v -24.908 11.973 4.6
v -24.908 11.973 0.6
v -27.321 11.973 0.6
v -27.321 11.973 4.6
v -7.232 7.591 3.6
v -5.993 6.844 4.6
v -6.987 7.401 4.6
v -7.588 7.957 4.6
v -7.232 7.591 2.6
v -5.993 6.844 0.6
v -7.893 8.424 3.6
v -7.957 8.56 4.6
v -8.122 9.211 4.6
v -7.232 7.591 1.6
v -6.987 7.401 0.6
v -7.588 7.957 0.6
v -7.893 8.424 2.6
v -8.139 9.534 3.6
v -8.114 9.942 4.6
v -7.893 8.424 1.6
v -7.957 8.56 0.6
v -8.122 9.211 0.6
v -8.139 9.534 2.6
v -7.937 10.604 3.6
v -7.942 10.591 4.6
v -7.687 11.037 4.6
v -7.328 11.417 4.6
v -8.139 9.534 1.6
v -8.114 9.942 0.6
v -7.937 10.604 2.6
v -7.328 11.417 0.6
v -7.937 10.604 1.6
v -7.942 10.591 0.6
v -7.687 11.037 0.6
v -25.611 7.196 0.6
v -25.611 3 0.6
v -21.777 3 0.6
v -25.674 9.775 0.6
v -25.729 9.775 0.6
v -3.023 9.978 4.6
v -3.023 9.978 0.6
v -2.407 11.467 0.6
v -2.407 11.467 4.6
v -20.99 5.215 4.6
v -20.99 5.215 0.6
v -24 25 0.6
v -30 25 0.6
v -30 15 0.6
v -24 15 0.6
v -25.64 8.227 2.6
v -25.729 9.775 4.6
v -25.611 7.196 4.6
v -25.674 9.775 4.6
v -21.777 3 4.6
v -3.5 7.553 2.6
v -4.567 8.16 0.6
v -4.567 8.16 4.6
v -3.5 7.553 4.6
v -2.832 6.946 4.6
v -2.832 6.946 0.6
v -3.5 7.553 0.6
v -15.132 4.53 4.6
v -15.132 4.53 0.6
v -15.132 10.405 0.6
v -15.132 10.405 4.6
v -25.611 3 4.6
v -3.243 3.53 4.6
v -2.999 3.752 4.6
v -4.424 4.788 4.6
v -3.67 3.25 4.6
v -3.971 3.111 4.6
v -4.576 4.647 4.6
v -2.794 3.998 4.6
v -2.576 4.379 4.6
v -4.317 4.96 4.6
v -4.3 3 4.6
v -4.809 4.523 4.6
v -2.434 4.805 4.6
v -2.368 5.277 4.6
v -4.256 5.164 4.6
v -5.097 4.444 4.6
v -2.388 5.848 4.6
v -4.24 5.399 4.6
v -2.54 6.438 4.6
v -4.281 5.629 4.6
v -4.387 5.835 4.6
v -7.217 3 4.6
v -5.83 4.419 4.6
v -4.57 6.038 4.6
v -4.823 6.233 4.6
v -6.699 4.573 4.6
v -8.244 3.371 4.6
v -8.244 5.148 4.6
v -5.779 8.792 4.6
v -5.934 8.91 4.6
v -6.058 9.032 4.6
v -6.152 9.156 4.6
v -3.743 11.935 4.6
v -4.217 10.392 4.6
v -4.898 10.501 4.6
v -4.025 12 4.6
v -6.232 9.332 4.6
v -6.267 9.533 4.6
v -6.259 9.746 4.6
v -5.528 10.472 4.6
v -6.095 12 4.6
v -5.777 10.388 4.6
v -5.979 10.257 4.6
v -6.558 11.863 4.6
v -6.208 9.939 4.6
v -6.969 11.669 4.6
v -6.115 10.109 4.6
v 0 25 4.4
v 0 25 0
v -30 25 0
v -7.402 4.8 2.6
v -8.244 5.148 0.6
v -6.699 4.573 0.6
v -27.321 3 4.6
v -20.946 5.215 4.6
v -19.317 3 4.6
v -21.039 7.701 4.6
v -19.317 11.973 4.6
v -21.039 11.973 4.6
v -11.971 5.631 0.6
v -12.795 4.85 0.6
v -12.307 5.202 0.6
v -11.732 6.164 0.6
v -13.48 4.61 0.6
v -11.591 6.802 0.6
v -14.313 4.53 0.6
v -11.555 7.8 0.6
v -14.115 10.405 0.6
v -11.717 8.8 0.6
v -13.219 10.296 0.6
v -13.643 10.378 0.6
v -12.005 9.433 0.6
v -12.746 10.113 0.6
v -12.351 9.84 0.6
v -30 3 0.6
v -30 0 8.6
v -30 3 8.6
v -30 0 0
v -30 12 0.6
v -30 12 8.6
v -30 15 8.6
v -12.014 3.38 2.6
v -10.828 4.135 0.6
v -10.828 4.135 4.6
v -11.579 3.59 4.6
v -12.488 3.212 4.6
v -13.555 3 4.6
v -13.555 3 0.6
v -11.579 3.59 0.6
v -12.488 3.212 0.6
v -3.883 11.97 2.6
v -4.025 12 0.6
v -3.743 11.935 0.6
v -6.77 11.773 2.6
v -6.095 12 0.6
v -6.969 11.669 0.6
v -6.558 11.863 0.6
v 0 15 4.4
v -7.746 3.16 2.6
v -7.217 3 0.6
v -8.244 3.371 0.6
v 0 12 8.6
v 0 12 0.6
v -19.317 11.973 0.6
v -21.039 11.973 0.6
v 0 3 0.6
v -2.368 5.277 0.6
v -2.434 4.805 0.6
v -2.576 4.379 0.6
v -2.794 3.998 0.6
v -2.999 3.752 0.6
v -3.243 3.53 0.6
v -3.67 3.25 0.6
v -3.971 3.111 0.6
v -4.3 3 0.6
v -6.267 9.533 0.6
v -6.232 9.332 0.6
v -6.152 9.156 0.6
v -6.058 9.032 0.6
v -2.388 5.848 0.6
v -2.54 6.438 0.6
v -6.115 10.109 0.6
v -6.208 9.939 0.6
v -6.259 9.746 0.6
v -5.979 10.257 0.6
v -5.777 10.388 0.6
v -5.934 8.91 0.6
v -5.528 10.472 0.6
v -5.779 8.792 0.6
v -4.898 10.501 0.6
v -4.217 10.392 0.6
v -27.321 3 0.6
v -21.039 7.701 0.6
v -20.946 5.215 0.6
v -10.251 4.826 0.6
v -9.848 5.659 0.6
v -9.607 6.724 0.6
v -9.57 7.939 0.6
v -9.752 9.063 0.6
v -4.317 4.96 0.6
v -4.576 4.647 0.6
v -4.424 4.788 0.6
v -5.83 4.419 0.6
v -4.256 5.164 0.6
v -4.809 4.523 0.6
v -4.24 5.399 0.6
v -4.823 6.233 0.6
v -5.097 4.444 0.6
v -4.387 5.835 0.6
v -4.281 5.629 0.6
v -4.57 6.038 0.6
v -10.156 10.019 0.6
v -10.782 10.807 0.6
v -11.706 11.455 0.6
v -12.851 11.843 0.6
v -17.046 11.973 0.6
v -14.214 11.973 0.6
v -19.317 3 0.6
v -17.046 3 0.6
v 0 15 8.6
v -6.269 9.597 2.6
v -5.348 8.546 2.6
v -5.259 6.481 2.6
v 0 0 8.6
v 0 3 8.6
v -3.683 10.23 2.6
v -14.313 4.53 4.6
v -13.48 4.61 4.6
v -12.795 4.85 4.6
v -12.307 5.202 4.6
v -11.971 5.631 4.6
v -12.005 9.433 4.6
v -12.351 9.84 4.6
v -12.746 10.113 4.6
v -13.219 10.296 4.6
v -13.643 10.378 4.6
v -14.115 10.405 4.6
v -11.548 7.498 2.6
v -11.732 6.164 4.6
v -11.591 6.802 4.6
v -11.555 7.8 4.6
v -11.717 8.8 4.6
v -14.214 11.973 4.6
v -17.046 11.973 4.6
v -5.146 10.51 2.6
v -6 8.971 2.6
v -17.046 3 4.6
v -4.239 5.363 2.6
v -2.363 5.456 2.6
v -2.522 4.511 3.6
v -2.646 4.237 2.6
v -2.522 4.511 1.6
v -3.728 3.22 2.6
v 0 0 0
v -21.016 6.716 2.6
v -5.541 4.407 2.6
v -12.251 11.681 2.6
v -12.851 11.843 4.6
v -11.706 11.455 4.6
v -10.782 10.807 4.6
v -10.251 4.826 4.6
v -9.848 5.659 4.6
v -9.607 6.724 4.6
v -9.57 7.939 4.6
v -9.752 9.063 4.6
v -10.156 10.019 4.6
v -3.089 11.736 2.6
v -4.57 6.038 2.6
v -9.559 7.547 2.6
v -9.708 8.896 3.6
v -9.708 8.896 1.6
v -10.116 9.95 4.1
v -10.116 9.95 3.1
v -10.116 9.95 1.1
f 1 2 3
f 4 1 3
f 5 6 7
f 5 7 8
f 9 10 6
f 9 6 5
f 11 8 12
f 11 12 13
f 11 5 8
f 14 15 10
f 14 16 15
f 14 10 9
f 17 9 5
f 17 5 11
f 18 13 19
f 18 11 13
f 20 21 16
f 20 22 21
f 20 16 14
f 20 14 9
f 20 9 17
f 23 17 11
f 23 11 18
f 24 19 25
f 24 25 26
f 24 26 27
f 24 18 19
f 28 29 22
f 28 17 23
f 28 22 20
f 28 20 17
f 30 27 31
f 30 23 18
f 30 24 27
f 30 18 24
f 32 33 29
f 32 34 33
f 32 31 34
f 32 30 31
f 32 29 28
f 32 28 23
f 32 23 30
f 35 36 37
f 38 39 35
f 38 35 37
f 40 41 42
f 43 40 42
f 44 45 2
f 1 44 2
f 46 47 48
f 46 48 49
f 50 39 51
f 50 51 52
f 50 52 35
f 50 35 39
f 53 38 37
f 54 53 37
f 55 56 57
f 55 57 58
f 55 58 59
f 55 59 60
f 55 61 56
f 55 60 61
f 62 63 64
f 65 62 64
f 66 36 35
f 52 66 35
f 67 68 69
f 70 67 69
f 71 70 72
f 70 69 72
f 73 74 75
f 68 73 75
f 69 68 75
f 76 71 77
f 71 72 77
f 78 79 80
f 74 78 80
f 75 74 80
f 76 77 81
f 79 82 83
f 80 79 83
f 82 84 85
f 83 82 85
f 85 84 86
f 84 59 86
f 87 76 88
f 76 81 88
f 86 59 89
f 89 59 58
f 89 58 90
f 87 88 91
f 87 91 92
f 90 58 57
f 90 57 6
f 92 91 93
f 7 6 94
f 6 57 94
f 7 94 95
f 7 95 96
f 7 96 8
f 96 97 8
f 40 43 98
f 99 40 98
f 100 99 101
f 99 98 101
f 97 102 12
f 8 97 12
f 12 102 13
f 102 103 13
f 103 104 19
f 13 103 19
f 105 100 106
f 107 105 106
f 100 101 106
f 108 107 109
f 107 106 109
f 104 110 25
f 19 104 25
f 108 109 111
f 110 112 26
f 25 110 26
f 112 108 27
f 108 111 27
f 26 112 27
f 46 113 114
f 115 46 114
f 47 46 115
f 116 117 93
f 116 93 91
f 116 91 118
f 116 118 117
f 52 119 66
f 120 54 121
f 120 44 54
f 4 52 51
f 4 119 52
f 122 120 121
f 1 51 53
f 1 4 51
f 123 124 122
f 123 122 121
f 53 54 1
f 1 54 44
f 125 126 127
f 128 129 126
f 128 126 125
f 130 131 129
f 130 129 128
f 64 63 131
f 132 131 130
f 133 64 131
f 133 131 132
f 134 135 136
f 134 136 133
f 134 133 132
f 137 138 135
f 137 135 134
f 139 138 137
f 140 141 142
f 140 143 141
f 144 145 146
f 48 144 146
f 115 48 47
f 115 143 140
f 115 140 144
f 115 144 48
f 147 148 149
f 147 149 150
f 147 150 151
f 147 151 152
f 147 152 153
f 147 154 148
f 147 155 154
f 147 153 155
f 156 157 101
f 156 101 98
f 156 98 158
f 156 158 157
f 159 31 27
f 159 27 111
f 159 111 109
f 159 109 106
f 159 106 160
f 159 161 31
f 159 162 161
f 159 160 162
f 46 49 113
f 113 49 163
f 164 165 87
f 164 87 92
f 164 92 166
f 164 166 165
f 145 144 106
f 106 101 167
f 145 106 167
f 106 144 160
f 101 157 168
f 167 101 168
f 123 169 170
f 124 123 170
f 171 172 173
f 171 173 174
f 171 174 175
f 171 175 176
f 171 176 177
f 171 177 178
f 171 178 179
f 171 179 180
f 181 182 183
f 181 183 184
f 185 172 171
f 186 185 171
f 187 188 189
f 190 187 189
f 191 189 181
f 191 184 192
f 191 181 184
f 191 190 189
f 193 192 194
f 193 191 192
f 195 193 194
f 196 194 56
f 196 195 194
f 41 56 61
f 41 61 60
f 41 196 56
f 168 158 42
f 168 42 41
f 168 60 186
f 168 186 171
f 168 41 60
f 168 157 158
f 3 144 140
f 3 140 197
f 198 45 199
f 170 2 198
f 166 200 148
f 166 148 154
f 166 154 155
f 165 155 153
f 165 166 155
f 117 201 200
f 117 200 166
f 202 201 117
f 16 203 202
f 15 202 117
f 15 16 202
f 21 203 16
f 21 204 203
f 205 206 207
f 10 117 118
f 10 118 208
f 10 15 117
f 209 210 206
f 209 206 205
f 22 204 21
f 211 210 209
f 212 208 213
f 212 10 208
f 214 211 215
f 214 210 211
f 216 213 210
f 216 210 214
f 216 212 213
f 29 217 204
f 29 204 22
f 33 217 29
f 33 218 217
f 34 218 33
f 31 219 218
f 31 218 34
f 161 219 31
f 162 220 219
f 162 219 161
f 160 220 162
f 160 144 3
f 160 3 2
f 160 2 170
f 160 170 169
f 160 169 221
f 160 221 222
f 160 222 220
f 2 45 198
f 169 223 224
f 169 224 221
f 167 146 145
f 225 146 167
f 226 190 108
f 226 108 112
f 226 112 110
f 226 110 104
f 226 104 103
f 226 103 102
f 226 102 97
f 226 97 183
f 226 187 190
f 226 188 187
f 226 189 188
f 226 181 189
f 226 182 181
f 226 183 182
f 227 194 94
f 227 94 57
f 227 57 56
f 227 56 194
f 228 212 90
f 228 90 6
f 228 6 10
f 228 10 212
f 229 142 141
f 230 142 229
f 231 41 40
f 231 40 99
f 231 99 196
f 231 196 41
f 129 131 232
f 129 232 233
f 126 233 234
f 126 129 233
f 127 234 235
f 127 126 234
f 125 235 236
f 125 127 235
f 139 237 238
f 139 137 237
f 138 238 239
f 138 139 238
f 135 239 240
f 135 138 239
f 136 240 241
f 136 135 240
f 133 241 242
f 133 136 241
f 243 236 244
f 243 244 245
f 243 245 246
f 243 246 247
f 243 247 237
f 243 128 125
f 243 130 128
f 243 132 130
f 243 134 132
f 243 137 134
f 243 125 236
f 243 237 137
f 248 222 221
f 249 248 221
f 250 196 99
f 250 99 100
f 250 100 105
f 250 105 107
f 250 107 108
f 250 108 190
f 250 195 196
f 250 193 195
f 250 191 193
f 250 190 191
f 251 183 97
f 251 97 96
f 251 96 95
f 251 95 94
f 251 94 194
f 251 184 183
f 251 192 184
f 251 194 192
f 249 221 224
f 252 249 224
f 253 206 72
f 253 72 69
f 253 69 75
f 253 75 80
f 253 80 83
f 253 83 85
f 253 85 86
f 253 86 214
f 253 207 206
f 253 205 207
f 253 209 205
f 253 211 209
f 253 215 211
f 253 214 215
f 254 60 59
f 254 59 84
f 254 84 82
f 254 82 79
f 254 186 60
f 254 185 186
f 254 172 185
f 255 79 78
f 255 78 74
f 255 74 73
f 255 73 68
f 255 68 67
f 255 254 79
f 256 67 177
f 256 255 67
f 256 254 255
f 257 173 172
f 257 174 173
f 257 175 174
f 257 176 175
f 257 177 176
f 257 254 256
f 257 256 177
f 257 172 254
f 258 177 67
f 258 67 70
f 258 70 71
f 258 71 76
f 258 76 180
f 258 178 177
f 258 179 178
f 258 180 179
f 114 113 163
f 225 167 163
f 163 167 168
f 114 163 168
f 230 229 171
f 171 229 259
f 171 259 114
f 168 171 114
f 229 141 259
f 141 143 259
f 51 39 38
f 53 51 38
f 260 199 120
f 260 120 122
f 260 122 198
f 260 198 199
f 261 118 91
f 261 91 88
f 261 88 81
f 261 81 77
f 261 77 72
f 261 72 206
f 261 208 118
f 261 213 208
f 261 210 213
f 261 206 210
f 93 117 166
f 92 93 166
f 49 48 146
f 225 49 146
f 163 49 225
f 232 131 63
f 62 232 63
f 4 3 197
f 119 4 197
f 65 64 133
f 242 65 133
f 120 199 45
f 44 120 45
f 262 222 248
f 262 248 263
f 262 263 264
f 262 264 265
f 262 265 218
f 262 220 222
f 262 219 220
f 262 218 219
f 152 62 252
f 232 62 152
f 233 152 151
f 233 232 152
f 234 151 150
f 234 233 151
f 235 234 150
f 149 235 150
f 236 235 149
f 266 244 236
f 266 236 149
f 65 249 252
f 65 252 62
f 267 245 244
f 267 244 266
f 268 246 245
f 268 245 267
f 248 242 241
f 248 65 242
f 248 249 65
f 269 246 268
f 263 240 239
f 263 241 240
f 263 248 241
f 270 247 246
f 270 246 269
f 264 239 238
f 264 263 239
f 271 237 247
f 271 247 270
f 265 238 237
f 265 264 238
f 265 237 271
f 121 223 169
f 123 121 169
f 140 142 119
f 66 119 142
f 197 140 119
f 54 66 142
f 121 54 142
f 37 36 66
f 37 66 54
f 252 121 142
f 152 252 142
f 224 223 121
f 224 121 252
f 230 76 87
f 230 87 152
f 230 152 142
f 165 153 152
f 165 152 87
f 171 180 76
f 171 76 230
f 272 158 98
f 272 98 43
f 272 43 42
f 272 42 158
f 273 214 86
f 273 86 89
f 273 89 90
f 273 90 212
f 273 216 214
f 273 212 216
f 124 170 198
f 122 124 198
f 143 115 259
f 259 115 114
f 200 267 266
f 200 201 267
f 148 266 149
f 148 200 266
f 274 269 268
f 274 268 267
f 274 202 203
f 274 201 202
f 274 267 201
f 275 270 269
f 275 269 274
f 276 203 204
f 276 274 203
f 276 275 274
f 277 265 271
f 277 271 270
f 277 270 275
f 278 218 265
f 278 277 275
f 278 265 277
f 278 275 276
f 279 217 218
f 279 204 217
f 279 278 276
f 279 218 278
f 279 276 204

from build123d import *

# Parameters (mm, degrees)
F0_W     = 30
F0_H     = 10
F0_H_2   = 15
F1_DEPTH = 0.6
F2_W     = 30
F2_H     = 3
F3_DEPTH = 8
F5_DEPTH = 10
F7_DEPTH = 4


with BuildPart() as f1:
    # F0 (on Top) → F1 (new body)
    with BuildSketch(Plane.XY):
        with Locations((-15, 20)):
            Rectangle(F0_W, F0_H)
        with Locations((-15, 7.5)):
            Rectangle(F0_W, F0_H_2)
    extrude(amount=F1_DEPTH)

    # F2 (on face) → F3 (join)
    with BuildSketch(Plane.XY.offset(0.6)):
        with Locations((-15, 13.5)):
            Rectangle(F2_W, F2_H)
        with Locations((-15, 1.5)):
            Rectangle(F2_W, F2_H)
    extrude(amount=F3_DEPTH)

    # F4 (on face) → F5 (join)
    with BuildSketch(Plane(origin=(0, 15, 0), x_dir=(-1, 0, 0), z_dir=(0, 1, 0))):
        Polygon((24, 0.6), (0, 4.4), (0, 0.6), align=None)
    extrude(amount=F5_DEPTH)

    # F6 (on face) → F7 (join)
    with BuildSketch(Plane.XY.offset(0.6)):
        Polygon((-21.7479817708, 2.95), (-19.3169704861, 2.95), (-19.3169704861, 3), (-21.7767433449, 3), align=None)
        with BuildLine():
            Line((-17.0459201389, 11.9729817708), (-17.0459201389, 3))
            Line((-17.0459201389, 3), (-13.5546069033, 3))
            add(Edge.make_bspline(
                [(-10.8281792535, 4.1348958333), (-11.8363616657, 3.1934025301), (-13.5546069033, 3)],
                knots=[0, 0, 0, 0.7945789636, 0.7945789636, 0.7945789636], degree=2))
            add(Edge.make_bspline(
                [(-9.5593532986, 7.5473958333), (-9.5593532986, 5.3197916667), (-10.8281792535, 4.1348958333)],
                knots=[0, 0, 0, 1, 1, 1], degree=2))
            add(Edge.make_bspline(
                [(-10.7817708333, 10.8068467882), (-9.5593532986, 9.6407118056), (-9.5593532986, 7.5473958333)],
                knots=[0, 0, 0, 1, 1, 1], degree=2))
            add(Edge.make_bspline(
                [(-14.2140190972, 11.9729817708), (-12.0041883681, 11.9729817708), (-10.7817708333, 10.8068467882)],
                knots=[0, 0, 0, 1, 1, 1], degree=2))
            Line((-14.2140190972, 11.9729817708), (-17.0459201389, 11.9729817708))
        make_face()
        with BuildLine():
            add(Edge.make_bspline(
                [(-11.5480034722, 7.4980251736), (-11.5480034722, 10.4049696181), (-14.1152777778, 10.4049696181)],
                knots=[0, 0, 0, 1, 1, 1], degree=2))
            add(Edge.make_bspline(
                [(-14.3127604167, 4.5298611111), (-11.5480034722, 4.5298611111), (-11.5480034722, 7.4980251736)],
                knots=[0, 0, 0, 1, 1, 1], degree=2))
            Line((-14.3127604167, 4.5298611111), (-15.1323133681, 4.5298611111))
            Line((-15.1323133681, 4.5298611111), (-15.1323133681, 10.4049696181))
            Line((-15.1323133681, 10.4049696181), (-14.1152777778, 10.4049696181))
        make_face(mode=Mode.SUBTRACT)
        with BuildLine():
            add(Edge.make_bspline(
                [(-7.2167314747, 3), (-7.7620891499, 3.1339116551), (-8.2441189236, 3.3706380208)],
                knots=[0.5656812019, 0.5656812019, 0.5656812019, 1, 1, 1], degree=2))
            Line((-7.2167314747, 3), (-4.2997672598, 3))
            add(Edge.make_bspline(
                [(-3.2428710938, 3.5296115451), (-3.6847580589, 3.176002784), (-4.2997672598, 3)],
                knots=[0, 0, 0, 0.5022669023, 0.5022669023, 0.5022669023], degree=2))
            add(Edge.make_bspline(
                [(-2.3630859375, 5.4560546875), (-2.3630859375, 4.2336371528), (-3.2428710938, 3.5296115451)],
                knots=[0, 0, 0, 1, 1, 1], degree=2))
            add(Edge.make_bspline(
                [(-2.8321072049, 6.9460611979), (-2.3630859375, 6.3388020833), (-2.3630859375, 5.4560546875)],
                knots=[0, 0, 0, 1, 1, 1], degree=2))
            add(Edge.make_bspline(
                [(-4.5669921875, 8.1595920139), (-3.3011284722, 7.5533203125), (-2.8321072049, 6.9460611979)],
                knots=[0, 0, 0, 1, 1, 1], degree=2))
            add(Edge.make_bspline(
                [(-5.7785481771, 8.7915364583), (-5.5228081597, 8.6157769097), (-4.5669921875, 8.1595920139)],
                knots=[0, 0, 0, 1, 1, 1], degree=2))
            add(Edge.make_bspline(
                [(-6.1517903646, 9.1558919271), (-6.0342881944, 8.9672960069), (-5.7785481771, 8.7915364583)],
                knots=[0, 0, 0, 1, 1, 1], degree=2))
            add(Edge.make_bspline(
                [(-6.2692925347, 9.597265625), (-6.2692925347, 9.3444878472), (-6.1517903646, 9.1558919271)],
                knots=[0, 0, 0, 1, 1, 1], degree=2))
            add(Edge.make_bspline(
                [(-5.9789930556, 10.2568576389), (-6.2692925347, 10.0040798611), (-6.2692925347, 9.597265625)],
                knots=[0, 0, 0, 1, 1, 1], degree=2))
            add(Edge.make_bspline(
                [(-5.1456163194, 10.5096354167), (-5.6886935764, 10.5096354167), (-5.9789930556, 10.2568576389)],
                knots=[0, 0, 0, 1, 1, 1], degree=2))
            add(Edge.make_bspline(
                [(-4.2174479167, 10.3921332465), (-4.6894314236, 10.5096354167), (-5.1456163194, 10.5096354167)],
                knots=[0, 0, 0, 1, 1, 1], degree=2))
            add(Edge.make_bspline(
                [(-3.0226779514, 9.9784071181), (-3.7454644097, 10.2746310764), (-4.2174479167, 10.3921332465)],
                knots=[0, 0, 0, 1, 1, 1], degree=2))
            Line((-3.0226779514, 9.9784071181), (-2.4065321181, 11.4674262153))
            add(Edge.make_bspline(
                [(-3.7425021701, 11.9354600694), (-3.1036458333, 11.7695746528), (-2.4065321181, 11.4674262153)],
                knots=[0, 0, 0, 1, 1, 1], degree=2))
            add(Edge.make_bspline(
                [(-4.024584157, 12), (-3.8820128143, 11.971685399), (-3.7425021701, 11.9354600694)],
                knots=[0.781624387, 0.781624387, 0.781624387, 1, 1, 1], degree=2))
            Line((-4.024584157, 12), (-6.0945606148, 12))
            add(Edge.make_bspline(
                [(-7.3277994792, 11.4170681424), (-6.8285068793, 11.8380046043), (-6.0945606148, 12)],
                knots=[0, 0, 0, 0.6151547553, 0.6151547553, 0.6151547553], degree=2))
            add(Edge.make_bspline(
                [(-8.139453125, 9.5340711806), (-8.139453125, 10.7327907986), (-7.3277994792, 11.4170681424)],
                knots=[0, 0, 0, 1, 1, 1], degree=2))
            add(Edge.make_bspline(
                [(-7.8925998264, 8.42421875), (-8.139453125, 8.9001519097), (-8.139453125, 9.5340711806)],
                knots=[0, 0, 0, 1, 1, 1], degree=2))
            add(Edge.make_bspline(
                [(-7.2320203993, 7.5908420139), (-7.6457465278, 7.9482855903), (-7.8925998264, 8.42421875)],
                knots=[0, 0, 0, 1, 1, 1], degree=2))
            add(Edge.make_bspline(
                [(-5.9928168403, 6.8443576389), (-6.8182942708, 7.2333984375), (-7.2320203993, 7.5908420139)],
                knots=[0, 0, 0, 1, 1, 1], degree=2))
            add(Edge.make_bspline(
                [(-4.8227322049, 6.2331488715), (-5.1100694444, 6.4237196181), (-5.9928168403, 6.8443576389)],
                knots=[0, 0, 0, 1, 1, 1], degree=2))
            add(Edge.make_bspline(
                [(-4.3872829861, 5.8352213542), (-4.5353949653, 6.042578125), (-4.8227322049, 6.2331488715)],
                knots=[0, 0, 0, 1, 1, 1], degree=2))
            add(Edge.make_bspline(
                [(-4.2391710069, 5.3632378472), (-4.2391710069, 5.6278645833), (-4.3872829861, 5.8352213542)],
                knots=[0, 0, 0, 1, 1, 1], degree=2))
            add(Edge.make_bspline(
                [(-4.5758789063, 4.6473632812), (-4.2391710069, 4.8873046875), (-4.2391710069, 5.3632378472)],
                knots=[0, 0, 0, 1, 1, 1], degree=2))
            add(Edge.make_bspline(
                [(-5.5405815972, 4.407421875), (-4.9125868056, 4.407421875), (-4.5758789063, 4.6473632812)],
                knots=[0, 0, 0, 1, 1, 1], degree=2))
            add(Edge.make_bspline(
                [(-6.6988172743, 4.5733072917), (-6.0658854167, 4.407421875), (-5.5405815972, 4.407421875)],
                knots=[0, 0, 0, 1, 1, 1], degree=2))
            add(Edge.make_bspline(
                [(-8.2441189236, 5.1479817708), (-7.3317491319, 4.7391927083), (-6.6988172743, 4.5733072917)],
                knots=[0, 0, 0, 1, 1, 1], degree=2))
            Line((-8.2441189236, 5.1479817708), (-8.2441189236, 3.3706380208))
        make_face()
        with BuildLine():
            Line((-21.7767433449, 3), (-19.3169704861, 3))
            Line((-19.3169704861, 3), (-19.3169704861, 11.9729817708))
            Line((-19.3169704861, 11.9729817708), (-21.0390190972, 11.9729817708))
            Line((-21.0390190972, 11.9729817708), (-21.0390190972, 7.7014322917))
            add(Edge.make_bspline(
                [(-20.9462022569, 5.2151258681), (-21.0390190972, 6.9746961806), (-21.0390190972, 7.7014322917)],
                knots=[0, 0, 0, 1, 1, 1], degree=2))
            Line((-20.9462022569, 5.2151258681), (-20.9896484375, 5.2151258681))
            Line((-20.9896484375, 5.2151258681), (-24.9077039931, 11.9729817708))
            Line((-24.9077039931, 11.9729817708), (-27.3209418403, 11.9729817708))
            Line((-27.3209418403, 11.9729817708), (-27.3209418403, 3))
            Line((-27.3209418403, 3), (-25.6107421875, 3))
            Line((-25.6107421875, 3), (-25.6107421875, 7.1958767361))
            add(Edge.make_bspline(
                [(-25.7292317708, 9.775), (-25.6107421875, 7.9680338542), (-25.6107421875, 7.1958767361)],
                knots=[0, 0, 0, 1, 1, 1], degree=2))
            Line((-25.7292317708, 9.775), (-25.6739366319, 9.775))
            Line((-25.6739366319, 9.775), (-21.7767433449, 3))
        make_face()
    extrude(amount=F7_DEPTH)


solid = f1.part
